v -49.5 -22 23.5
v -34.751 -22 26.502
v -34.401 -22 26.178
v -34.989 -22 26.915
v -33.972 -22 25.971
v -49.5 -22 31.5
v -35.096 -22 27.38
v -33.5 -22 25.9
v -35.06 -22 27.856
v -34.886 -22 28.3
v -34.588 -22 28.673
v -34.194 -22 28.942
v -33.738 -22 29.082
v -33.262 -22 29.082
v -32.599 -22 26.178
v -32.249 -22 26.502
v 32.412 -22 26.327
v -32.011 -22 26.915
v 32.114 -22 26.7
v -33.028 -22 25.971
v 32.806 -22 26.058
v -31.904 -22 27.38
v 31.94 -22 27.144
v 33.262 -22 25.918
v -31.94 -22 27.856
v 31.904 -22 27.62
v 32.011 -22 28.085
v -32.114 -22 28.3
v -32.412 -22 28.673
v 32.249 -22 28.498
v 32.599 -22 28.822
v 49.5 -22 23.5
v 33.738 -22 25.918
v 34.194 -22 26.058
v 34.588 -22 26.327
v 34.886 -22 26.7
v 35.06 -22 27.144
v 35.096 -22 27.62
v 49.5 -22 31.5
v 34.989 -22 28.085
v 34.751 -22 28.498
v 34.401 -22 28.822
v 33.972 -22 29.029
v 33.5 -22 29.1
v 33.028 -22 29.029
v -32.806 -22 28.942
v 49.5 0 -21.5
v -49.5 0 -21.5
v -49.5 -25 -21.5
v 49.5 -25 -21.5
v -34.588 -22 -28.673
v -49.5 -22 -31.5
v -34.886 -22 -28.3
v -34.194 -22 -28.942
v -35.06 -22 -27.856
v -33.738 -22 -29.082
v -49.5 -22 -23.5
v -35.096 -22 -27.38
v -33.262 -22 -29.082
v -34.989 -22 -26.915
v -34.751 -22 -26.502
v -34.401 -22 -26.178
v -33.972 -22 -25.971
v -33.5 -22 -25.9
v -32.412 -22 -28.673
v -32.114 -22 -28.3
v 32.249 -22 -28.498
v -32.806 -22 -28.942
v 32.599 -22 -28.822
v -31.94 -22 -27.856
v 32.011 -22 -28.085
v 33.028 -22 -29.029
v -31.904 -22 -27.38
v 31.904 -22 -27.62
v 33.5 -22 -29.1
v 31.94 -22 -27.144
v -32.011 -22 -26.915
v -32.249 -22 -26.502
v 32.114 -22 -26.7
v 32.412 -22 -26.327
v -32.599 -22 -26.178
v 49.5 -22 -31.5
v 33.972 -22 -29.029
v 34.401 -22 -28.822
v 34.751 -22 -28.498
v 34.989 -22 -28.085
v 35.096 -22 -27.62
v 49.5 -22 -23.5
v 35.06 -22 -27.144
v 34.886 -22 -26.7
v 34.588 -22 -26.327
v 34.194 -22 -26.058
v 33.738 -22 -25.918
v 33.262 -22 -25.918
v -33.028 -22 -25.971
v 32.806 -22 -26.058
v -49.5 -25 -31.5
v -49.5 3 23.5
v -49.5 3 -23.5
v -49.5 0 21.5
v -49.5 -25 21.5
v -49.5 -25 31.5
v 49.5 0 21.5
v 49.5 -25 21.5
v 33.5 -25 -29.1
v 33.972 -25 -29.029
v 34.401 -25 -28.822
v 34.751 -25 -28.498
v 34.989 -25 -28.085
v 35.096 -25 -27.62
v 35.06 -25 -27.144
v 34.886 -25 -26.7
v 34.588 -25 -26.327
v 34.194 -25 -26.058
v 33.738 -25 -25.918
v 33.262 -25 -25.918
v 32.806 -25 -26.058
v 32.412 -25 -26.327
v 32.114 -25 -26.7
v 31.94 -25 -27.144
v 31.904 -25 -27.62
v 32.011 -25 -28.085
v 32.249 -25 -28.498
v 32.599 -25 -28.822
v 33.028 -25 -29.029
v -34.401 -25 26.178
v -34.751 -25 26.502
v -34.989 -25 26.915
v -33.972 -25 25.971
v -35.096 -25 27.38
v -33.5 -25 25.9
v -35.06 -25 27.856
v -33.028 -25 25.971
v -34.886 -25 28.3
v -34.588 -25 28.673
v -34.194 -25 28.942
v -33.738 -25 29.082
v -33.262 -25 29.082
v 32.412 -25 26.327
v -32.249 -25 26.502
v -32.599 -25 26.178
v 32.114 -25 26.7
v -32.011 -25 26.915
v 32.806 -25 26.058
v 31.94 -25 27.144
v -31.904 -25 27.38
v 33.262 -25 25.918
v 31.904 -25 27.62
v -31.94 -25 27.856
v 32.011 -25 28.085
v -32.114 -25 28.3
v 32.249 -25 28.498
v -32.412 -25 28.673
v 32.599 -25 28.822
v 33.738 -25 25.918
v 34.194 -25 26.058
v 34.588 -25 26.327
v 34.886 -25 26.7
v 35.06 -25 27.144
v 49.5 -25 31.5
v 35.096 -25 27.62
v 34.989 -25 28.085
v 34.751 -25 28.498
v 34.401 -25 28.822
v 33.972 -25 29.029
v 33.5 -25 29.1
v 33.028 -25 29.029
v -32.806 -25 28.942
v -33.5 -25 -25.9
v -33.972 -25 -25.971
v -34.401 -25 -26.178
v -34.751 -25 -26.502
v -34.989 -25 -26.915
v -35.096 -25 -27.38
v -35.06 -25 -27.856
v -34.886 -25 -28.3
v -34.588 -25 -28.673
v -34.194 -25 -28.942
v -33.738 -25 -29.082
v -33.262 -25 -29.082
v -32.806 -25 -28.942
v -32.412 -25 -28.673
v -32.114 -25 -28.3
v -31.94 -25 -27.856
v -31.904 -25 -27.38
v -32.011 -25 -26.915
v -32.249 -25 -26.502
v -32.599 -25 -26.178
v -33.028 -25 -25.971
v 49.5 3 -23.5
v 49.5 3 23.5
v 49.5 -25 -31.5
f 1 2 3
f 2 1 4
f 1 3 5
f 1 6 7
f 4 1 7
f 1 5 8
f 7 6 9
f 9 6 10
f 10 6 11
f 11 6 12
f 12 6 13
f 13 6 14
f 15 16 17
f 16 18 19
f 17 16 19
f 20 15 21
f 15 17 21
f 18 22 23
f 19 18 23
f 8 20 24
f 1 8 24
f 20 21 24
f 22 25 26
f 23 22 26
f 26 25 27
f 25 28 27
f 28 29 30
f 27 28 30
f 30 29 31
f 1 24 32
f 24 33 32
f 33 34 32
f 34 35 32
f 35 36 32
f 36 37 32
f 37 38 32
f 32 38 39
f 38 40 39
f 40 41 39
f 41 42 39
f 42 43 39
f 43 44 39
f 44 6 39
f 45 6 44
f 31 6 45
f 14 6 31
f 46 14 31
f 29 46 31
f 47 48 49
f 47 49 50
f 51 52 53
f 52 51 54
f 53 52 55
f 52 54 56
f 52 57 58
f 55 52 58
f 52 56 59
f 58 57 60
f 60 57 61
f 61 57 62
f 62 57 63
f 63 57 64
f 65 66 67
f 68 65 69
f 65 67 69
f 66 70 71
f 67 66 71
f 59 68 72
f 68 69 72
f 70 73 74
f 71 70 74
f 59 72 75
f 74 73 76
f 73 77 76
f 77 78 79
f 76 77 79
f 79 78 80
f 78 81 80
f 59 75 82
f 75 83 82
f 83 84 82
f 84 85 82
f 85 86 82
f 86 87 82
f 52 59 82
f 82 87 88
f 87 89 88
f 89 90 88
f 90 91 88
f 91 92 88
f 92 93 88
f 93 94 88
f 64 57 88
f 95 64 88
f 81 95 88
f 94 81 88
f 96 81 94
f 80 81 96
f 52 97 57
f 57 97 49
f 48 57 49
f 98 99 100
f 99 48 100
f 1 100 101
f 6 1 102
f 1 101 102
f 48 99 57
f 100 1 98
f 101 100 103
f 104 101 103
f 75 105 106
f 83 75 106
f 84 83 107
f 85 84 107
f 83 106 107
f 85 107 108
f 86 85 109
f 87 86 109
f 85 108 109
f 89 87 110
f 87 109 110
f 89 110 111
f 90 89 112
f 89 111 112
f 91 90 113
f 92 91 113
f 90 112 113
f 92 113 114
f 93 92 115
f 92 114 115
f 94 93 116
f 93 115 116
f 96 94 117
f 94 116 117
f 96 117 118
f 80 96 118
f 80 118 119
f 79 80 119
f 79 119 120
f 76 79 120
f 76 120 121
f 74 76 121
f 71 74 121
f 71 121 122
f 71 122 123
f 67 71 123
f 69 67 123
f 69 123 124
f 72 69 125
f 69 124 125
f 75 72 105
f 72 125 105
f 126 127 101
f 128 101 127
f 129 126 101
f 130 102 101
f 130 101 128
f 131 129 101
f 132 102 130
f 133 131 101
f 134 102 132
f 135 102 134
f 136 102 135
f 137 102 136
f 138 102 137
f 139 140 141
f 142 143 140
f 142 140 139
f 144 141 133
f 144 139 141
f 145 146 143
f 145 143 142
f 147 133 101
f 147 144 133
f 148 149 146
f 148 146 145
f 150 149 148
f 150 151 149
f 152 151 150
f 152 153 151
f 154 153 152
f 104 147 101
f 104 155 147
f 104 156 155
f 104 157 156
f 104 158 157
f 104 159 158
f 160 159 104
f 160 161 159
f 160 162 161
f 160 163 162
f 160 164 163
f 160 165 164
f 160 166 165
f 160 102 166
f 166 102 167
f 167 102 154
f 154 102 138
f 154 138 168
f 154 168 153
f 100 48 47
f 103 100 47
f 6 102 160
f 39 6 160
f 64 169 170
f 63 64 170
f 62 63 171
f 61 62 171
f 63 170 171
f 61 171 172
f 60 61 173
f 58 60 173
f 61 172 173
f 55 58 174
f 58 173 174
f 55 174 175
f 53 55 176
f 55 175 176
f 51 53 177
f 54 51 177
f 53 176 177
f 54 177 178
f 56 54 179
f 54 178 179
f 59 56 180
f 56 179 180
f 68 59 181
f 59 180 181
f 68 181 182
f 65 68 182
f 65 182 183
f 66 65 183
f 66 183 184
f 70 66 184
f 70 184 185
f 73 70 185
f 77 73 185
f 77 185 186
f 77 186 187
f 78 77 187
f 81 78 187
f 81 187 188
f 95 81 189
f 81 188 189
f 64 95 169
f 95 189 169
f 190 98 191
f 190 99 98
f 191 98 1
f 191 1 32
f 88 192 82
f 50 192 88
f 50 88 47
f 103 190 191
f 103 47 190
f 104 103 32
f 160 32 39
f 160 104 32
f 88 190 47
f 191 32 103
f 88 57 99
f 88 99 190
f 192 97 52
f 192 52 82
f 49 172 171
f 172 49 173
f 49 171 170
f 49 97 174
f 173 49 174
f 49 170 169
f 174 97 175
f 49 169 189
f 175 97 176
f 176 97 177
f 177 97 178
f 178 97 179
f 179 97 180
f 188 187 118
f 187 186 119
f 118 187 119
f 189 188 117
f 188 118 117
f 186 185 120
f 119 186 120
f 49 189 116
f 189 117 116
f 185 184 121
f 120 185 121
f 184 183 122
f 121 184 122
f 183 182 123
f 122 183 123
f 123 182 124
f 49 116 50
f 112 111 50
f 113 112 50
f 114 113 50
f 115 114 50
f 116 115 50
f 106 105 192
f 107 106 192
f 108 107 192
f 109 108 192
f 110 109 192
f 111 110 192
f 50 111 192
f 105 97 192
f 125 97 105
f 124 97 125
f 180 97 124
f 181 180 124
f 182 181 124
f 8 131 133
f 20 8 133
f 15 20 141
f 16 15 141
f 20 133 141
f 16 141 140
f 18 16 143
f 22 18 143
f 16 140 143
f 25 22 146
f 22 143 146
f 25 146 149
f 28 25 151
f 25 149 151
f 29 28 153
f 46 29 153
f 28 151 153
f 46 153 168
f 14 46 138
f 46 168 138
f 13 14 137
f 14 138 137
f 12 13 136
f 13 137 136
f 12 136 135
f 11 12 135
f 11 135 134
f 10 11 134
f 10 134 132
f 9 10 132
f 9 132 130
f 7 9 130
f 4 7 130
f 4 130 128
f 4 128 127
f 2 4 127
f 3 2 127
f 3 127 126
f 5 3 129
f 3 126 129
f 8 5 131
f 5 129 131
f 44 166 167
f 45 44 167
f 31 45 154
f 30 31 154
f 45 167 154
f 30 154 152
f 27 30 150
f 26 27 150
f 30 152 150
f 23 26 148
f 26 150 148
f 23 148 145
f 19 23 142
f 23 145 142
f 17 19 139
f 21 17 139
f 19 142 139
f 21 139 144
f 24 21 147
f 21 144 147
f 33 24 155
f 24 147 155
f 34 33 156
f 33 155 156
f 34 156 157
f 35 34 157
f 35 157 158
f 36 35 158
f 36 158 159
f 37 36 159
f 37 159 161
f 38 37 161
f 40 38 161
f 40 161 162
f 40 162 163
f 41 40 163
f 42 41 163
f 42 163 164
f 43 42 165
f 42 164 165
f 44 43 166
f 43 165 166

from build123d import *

# Parameters (mm, degrees)
SKETCH1_W           = 99
SKETCH1_H           = 47
BOSS_EXTRUDE1_DEPTH = 3
SKETCH1_5_W         = 99
SKETCH1_5_H         = 2
BOSS_EXTRUDE2_DEPTH = 25
SKETCH3_W           = 99
SKETCH3_H           = 8
SKETCH3_R           = 1.6
BOSS_EXTRUDE3_DEPTH = 3


with BuildPart() as part:
    # Sketch1 → Boss-Extrude1 (new body)
    with BuildSketch(Plane(origin=(0, 0, 0), x_dir=(1, 0, 0), z_dir=(0, 1, 0))):
        Rectangle(SKETCH1_W, SKETCH1_H)
    extrude(amount=BOSS_EXTRUDE1_DEPTH)

    # Sketch1<5> → Boss-Extrude2 (add)
    with BuildSketch(Plane(origin=(0, 0, 0), x_dir=(1, 0, 0), z_dir=(0, 1, 0))):
        with Locations((0, 22.5)):
            Rectangle(SKETCH1_5_W, SKETCH1_5_H)
        with Locations((0, -22.5)):
            Rectangle(SKETCH1_5_W, SKETCH1_5_H)
    extrude(amount=-BOSS_EXTRUDE2_DEPTH)

    # Sketch3 → Boss-Extrude3 (add)
    # profile 1 of 2: a face of its own
    with BuildSketch(Plane.XZ.offset(25)):
        with Locations((0, 27.5)):
            Rectangle(SKETCH3_W, SKETCH3_H)
        with Locations((-33.5, 27.5)):
            Circle(SKETCH3_R, mode=Mode.SUBTRACT)
        with Locations((33.5, 27.5)):
            Circle(SKETCH3_R, mode=Mode.SUBTRACT)
    # profile 2 of 2: a face of its own
    with BuildSketch(Plane.XZ.offset(25)):
        with Locations((0, -27.5)):
            Rectangle(SKETCH3_W, SKETCH3_H)
        with Locations((33.5, -27.5)):
            Circle(SKETCH3_R, mode=Mode.SUBTRACT)
        with Locations((-33.5, -27.5)):
            Circle(SKETCH3_R, mode=Mode.SUBTRACT)
    extrude(amount=-BOSS_EXTRUDE3_DEPTH)


solid = part.part
